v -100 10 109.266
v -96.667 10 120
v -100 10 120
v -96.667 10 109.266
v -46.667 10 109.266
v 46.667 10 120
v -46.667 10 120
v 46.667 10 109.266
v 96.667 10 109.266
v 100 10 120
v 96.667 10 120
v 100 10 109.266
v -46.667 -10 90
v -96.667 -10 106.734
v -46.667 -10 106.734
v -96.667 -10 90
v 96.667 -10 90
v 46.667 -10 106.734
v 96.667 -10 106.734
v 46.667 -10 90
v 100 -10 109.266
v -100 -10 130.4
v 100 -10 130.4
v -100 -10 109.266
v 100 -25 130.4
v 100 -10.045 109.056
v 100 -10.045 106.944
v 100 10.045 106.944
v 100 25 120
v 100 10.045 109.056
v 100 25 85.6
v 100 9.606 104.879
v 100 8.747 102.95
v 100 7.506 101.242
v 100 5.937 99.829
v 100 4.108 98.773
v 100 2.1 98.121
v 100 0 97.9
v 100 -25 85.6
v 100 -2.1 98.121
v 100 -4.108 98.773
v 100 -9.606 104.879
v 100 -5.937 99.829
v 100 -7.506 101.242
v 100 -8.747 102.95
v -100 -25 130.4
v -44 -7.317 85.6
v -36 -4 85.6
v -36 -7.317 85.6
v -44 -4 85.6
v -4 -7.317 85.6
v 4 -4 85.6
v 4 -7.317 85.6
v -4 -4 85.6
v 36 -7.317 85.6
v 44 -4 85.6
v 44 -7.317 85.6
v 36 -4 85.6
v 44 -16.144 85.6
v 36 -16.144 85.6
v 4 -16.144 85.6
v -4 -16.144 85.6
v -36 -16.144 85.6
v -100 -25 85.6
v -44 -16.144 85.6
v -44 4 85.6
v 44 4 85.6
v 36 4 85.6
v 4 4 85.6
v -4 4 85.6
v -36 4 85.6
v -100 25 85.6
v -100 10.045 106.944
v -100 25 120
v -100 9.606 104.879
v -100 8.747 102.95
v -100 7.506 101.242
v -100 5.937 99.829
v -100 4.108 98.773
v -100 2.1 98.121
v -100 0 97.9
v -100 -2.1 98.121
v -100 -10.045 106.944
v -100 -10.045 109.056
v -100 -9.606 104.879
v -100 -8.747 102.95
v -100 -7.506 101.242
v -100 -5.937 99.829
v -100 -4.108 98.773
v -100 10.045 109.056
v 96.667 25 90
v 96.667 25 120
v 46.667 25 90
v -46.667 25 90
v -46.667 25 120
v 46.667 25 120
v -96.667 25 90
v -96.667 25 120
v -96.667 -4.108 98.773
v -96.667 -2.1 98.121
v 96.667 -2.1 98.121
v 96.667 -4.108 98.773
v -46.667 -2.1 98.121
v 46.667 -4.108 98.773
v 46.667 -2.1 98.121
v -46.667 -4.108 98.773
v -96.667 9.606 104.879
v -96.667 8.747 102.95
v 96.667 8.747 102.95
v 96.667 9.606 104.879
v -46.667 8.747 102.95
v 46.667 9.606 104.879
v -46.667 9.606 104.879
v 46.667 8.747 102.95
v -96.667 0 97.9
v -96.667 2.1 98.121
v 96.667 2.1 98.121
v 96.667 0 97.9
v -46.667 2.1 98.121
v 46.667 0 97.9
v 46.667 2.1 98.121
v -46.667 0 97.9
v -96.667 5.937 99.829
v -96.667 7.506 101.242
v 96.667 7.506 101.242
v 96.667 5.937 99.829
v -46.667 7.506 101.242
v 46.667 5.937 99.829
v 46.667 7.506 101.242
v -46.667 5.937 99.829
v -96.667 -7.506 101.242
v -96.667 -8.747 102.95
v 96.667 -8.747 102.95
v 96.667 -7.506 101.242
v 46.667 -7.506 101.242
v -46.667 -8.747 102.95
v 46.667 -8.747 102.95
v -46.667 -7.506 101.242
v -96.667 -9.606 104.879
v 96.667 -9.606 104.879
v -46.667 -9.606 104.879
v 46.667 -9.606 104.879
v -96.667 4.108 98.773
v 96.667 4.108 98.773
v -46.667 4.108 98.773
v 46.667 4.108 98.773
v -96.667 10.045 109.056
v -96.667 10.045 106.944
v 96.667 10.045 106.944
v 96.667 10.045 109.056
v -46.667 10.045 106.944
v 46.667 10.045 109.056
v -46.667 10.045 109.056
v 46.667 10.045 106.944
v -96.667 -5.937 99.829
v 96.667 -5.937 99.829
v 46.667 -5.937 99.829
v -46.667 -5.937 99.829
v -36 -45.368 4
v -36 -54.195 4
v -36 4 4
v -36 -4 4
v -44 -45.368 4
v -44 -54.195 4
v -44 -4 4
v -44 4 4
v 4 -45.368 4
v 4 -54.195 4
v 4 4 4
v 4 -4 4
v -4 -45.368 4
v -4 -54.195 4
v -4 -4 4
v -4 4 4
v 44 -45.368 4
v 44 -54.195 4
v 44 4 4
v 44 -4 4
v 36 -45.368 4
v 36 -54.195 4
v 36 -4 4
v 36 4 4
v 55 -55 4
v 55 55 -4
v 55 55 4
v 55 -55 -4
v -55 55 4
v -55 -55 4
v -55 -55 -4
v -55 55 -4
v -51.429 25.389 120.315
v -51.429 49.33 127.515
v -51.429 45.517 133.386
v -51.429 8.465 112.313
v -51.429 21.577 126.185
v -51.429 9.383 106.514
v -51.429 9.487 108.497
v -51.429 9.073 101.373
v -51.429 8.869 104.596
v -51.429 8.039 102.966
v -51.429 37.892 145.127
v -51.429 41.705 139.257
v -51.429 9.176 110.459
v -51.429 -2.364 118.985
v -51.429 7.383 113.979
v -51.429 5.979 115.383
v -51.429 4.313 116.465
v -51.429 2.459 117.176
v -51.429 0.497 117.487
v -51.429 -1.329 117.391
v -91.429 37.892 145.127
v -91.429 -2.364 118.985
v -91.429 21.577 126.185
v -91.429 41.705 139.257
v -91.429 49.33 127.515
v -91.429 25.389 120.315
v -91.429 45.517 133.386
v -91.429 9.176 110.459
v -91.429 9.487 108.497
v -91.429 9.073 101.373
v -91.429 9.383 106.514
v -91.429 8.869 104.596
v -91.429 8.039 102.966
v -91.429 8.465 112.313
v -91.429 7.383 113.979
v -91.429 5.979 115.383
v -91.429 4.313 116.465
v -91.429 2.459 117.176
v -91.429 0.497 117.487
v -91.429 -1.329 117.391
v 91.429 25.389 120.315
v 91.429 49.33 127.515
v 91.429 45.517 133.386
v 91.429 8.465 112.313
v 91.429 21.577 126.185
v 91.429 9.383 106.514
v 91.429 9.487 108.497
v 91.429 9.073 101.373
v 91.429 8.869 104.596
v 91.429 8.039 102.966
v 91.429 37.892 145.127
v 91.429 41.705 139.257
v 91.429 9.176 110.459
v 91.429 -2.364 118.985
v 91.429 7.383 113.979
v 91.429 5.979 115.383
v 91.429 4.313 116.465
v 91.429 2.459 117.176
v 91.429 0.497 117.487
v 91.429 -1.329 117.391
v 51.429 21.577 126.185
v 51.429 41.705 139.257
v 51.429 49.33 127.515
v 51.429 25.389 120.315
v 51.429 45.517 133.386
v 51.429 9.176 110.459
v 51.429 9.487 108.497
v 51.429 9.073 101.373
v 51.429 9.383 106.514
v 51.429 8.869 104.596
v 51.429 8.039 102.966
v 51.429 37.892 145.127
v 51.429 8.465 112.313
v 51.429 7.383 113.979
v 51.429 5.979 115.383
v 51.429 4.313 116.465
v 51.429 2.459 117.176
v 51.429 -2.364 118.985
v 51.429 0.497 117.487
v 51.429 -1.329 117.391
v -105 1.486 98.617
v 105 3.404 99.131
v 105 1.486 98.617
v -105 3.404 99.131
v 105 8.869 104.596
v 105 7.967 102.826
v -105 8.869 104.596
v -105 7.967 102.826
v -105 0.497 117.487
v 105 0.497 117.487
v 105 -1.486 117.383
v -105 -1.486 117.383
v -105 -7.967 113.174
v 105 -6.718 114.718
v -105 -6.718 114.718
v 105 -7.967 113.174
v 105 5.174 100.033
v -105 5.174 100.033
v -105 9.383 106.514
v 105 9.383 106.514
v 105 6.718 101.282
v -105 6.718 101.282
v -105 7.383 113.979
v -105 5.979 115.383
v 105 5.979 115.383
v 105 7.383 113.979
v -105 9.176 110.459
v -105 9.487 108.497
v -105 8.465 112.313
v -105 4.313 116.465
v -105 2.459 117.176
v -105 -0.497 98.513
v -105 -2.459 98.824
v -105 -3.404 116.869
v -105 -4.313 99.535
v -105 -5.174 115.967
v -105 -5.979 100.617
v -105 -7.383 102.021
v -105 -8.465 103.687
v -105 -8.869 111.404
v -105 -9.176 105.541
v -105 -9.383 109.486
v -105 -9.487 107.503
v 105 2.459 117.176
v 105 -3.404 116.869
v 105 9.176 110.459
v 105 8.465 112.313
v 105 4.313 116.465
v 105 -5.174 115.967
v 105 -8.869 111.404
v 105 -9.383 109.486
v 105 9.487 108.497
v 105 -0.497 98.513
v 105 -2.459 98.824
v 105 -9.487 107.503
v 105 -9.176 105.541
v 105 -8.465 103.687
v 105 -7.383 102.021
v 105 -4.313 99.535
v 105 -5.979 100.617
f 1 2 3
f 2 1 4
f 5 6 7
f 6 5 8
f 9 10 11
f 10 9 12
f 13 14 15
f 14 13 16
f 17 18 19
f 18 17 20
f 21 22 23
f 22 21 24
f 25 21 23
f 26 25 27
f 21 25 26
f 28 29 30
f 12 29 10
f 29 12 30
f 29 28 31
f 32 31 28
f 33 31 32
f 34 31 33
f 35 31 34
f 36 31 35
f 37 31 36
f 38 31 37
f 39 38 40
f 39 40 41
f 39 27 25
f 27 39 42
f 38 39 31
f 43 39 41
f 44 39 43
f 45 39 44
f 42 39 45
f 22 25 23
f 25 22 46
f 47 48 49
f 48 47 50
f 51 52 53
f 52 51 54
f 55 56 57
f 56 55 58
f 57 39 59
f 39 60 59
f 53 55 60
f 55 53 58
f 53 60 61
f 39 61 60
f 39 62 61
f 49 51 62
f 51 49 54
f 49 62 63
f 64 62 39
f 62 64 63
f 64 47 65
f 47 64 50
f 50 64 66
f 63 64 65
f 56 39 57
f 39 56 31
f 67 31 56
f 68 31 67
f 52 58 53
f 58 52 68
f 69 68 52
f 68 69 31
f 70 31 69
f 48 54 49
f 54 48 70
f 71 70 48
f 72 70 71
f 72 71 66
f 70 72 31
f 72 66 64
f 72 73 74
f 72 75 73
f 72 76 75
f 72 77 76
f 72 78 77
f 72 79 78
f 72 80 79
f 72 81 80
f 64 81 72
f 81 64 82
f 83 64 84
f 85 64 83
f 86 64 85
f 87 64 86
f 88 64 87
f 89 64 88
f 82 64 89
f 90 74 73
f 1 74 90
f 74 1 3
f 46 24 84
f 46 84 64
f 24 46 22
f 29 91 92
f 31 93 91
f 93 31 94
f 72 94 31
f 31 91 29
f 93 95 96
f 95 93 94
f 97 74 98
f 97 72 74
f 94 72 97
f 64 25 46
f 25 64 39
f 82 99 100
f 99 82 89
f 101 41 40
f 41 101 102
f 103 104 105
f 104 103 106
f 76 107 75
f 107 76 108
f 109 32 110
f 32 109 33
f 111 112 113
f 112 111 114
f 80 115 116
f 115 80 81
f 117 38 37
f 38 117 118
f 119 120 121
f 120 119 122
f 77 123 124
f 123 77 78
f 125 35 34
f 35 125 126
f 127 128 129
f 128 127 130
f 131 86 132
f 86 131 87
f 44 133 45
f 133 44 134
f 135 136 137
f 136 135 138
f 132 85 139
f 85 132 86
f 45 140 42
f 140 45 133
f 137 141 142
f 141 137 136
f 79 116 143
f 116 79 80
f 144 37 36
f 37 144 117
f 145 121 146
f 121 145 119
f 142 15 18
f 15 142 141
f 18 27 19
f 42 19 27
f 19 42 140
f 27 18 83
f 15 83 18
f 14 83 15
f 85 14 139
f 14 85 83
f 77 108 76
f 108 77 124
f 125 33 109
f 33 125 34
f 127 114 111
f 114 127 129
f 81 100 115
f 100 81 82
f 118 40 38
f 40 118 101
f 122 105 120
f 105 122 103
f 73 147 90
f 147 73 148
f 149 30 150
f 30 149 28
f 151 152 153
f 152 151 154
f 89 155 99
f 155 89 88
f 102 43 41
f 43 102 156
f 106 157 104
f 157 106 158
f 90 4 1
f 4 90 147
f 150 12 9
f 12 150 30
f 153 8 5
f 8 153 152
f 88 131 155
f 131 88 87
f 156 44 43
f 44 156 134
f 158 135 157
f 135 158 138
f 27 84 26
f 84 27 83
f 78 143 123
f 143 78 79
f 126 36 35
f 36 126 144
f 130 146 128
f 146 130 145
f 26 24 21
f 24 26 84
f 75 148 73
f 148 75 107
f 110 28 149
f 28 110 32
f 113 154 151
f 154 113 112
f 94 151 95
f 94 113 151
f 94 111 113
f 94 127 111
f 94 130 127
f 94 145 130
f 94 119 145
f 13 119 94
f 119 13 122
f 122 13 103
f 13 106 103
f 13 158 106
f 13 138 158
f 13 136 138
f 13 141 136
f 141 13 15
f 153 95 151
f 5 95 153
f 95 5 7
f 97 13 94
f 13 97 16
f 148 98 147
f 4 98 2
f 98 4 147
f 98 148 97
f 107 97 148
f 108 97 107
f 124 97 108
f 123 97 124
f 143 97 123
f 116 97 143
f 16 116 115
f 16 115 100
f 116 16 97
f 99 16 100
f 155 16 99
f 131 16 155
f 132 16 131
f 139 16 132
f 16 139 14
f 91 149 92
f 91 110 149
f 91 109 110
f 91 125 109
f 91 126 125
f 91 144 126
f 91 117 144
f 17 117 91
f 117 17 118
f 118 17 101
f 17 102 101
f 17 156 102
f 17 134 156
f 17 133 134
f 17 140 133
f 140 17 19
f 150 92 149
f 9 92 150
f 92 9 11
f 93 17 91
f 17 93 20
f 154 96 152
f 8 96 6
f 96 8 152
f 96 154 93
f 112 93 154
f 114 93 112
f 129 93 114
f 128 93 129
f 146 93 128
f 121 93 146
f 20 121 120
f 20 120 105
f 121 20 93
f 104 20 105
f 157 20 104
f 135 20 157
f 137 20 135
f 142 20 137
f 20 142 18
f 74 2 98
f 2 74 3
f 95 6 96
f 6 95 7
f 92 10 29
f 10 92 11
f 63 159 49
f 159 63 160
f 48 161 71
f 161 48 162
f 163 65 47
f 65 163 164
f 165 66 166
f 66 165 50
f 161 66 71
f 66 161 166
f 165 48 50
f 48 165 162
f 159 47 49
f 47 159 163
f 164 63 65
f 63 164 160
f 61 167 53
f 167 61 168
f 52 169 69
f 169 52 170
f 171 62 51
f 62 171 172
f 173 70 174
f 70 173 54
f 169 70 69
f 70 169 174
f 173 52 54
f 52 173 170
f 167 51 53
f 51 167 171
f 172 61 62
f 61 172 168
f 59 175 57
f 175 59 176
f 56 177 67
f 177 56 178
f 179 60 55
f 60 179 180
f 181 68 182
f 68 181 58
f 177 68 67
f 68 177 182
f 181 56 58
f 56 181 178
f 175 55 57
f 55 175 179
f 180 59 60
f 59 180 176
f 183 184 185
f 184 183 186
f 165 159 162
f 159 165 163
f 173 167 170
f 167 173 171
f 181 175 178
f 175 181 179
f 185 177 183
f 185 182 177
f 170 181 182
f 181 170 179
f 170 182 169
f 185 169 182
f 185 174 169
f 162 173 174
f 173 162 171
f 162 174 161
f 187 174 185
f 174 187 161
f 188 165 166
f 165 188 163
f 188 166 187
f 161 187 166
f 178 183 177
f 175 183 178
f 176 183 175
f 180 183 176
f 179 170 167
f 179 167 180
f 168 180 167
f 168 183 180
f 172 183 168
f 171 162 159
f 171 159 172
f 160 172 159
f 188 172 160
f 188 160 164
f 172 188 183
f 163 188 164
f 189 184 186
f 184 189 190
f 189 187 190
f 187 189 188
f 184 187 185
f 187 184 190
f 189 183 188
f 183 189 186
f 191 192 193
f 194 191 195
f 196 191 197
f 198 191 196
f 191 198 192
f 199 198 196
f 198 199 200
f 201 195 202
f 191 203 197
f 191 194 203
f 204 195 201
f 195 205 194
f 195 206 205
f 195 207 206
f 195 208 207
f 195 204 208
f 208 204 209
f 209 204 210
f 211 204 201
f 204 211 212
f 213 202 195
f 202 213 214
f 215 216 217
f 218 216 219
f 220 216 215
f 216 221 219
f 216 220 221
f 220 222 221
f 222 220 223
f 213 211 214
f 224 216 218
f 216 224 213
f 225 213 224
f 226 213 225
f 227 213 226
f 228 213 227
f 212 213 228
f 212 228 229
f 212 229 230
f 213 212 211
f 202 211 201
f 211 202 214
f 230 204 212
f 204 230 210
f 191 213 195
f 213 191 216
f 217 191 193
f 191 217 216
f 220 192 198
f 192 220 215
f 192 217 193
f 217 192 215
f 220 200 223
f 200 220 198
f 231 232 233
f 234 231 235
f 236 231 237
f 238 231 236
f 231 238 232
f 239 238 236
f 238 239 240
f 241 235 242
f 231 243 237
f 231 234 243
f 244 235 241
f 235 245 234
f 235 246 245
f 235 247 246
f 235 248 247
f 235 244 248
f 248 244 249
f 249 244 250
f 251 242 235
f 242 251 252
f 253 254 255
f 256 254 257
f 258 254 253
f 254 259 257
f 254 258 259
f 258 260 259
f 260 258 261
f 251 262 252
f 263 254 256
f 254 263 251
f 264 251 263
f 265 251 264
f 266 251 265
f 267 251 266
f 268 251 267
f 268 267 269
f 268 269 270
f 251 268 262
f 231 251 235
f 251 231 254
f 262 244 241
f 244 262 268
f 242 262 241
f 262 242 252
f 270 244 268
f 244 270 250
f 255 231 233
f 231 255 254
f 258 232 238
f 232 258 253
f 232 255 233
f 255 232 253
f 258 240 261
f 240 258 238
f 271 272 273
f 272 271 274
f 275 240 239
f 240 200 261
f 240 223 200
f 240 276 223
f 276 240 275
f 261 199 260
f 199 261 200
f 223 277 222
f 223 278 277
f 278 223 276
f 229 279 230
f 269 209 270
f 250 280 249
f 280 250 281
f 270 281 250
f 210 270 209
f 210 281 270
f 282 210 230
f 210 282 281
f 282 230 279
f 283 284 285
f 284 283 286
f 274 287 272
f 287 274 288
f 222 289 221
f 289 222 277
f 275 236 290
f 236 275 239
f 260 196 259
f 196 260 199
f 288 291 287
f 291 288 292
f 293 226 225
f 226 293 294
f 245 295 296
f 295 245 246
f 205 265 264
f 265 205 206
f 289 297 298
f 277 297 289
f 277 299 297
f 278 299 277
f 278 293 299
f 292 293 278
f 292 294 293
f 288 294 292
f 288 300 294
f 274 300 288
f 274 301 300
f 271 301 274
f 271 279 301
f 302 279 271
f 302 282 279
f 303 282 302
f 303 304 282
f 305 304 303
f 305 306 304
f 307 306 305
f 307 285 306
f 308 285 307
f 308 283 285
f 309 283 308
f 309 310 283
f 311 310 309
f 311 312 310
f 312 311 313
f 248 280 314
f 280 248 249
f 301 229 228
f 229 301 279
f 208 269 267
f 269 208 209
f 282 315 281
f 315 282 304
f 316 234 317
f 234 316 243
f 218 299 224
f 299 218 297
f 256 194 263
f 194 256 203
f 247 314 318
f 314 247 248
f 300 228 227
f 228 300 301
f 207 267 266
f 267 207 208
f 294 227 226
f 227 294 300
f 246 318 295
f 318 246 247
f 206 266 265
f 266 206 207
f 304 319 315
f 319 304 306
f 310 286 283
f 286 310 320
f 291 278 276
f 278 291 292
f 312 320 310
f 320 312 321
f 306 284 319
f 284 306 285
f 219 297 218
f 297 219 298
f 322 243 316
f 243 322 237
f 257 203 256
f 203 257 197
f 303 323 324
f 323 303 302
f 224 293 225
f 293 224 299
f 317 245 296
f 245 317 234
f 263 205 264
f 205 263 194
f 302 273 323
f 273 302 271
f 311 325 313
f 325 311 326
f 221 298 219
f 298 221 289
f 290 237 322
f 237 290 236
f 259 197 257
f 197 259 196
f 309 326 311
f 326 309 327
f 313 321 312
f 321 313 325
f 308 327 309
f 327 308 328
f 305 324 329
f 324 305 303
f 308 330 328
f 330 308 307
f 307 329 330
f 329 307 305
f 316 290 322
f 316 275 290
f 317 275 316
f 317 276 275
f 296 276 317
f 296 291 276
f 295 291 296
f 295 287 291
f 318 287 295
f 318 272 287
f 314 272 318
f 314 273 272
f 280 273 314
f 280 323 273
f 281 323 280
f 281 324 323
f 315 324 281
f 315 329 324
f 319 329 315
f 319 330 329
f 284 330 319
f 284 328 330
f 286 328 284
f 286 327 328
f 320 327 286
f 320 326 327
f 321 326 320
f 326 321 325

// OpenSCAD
// file: clampipe.scad
   include <../robot_settings.scad>

module clam_pipe() {
      // clam pipe
       translate([0, 0, 0]) {
          rotate([0, 90, 0])
          cylinder(h = rail_width + 10, d = 19, center = true);
       }

       blade_length = 48;
       filling_length = 26;
      
      // clams
       translate([0, 13, 0])
       {
         // right upper clam blade
        translate([-rail_width / 2.8,  15, rail_thickness])
        cube([rail_width / 5,  blade_length, rail_thickness], center = true);
         
         // right filling
         translate([-rail_width / 2.8, 2, -1])
         cube([rail_width / 5, filling_length, rail_thickness + 2], center = true);
         
         // right lower clam blade
        translate([-rail_width / 2.8,  15, -rail_thickness])
        cube([rail_width / 5,  blade_length, rail_thickness], center = true);
         
         // left filling
         translate([rail_width / 2.8, 2, -1])
         cube([rail_width / 5, filling_length, rail_thickness + 2], center = true);
         
        // left upper clam blade
        translate([rail_width / 2.8,  15, rail_thickness])
        cube([rail_width / 5,  blade_length, rail_thickness], center = true);
        
         // left lower clam blade
        translate([rail_width / 2.8,  15, -rail_thickness])
        cube([rail_width / 5,  blade_length, rail_thickness], center = true);
      }
    }
    clam_pipe();
// file: ../robot_settings.scad
main_box_x = 95; // 96
main_box_y = 102;
main_box_z = 74; // 74.5
wall_thickness = 2;

rail_gap = 2;
rail_inset = 7;

rail_thickness = 7;
rail_length = 250;
rail_width = 200;

raspberry_pi_screw_seperation_y = 57;
raspberry_pi_screw_seperation_z = 48;
raspberry_pi_peg_h = 4;

gears_module = 1;
pinion_gear_teeth = 30;
pinion_gear_width = 5;
pinion_gear_bore = 4;

gears_setback_distance = 25;
gear_post_height = 2 * pinion_gear_width + rail_thickness + 8 ;

steering_motor_mount_x = 45;
steering_motor_mount_y = 36;
steering_motor_mount_z = 18;
steering_motor_mount_setback_distance = gears_setback_distance + 16;

dc_motor_drivertype = "Teyleten"; // Teyleten
isAdafruit = (dc_motor_drivertype == "Adafruit");

drv8871_x = isAdafruit ? 20.3 : 21.6;
drv8871_y = isAdafruit ?  24 : 25;

drv8871_z = 2;
drv8871_screw_d = 2.5;
drv8871_solder_points_z = 2;

drv8871mount_edge_x = 1.5;
drv8871mount_edge_wall = 3;
drv8871mount_z = 5;
drv8871mount_x = drv8871_x +  drv8871mount_edge_wall - 2* drv8871mount_edge_x;
drv8871mount_y = 19;

drv8871_screw_distance = 15.64;
drv8871_solder_points_d = 1.66;
drv8871_solder_offset_y = 4.4;
drv8871_solder_inner_points_distance = 5;
drv8871_solder_outer_points_distance = 12;

dc_motor_housing_minus_encoder_z = 48;
dc_motor_encoder_z = 9.33;
dc_motor_encoder_wheel_d = 13.4;
dc_motor_encoder_wheel_thickness = 5;
dc_motor_encoder_wheel_gap = 3;
dc_motor_encoder_circuit_thickness = 2;
dc_motor_cutout_d = 24.8;
dc_motor_cutout_z = 19.5;

dc_motor_screw_head_z = 2;
dc_motor_screw_head_d = 5.6;
dc_motor_screw_d = 3.2;
dc_motor_screw_offset = 8.5;

dc_motor_axle_ring_z = 3;
dc_motor_axle_ring_d = 7.2;
dc_motor_axle_cutout_d = 4.5;
dc_motor_axle_cutout_z = 10;
dc_motor_axle_notch_cutout = 0.4;
dc_motor_axle_notch_cutout_z = 6;

pdmount_x = 20;
pdmount_y = 30;
pdmount_z = 2;
pdmount_edge_x = 1.5;
pdmount_edge_wall = 3;

steering_shaft_z = 45;
steering_shaft_d = 7;
steering_shaft_motor_fitting_d = 9;
coupler_length = 24.6;
coupler_diameter = 14;
coupler_screw_d = 4;
coupler_screw_z_offset = 5;
coupler_gear_side_insert = 12.6;
steering_shaft_with_coupler_z = steering_shaft_z - coupler_gear_side_insert;

lidar_mount_y = 110;
lidar_mount_x = 65 + 20;
lidar_narrow_screws = 40;
lidar_wide_screws = 56;
lidar_front_to_back_screws = 70;
lidar_screw_d = 3;
lidar_circuitboard_x = 20;
lidar_circuitboard_y = 35;
lidar_circuitboard_z = 1.2;
lidar_cord_length = 29;

ball_bearing_height = 7;
ball_bearing_outer_diameter = 22;
ball_bearing_inner_diameter = 8;

pull_bar_radius = 3.3;

rack_module = 1;
rack_length = main_box_x / 2;
rack_height = 10;
rack_width = 10;
rack_teeth = 30;
rack_bore = 3;

// tire hardware
axle_length = 30;
axle_reciever_inner_diameter = 7.75;
axle_reciever_length = 18.8;
axle_notch_length = 7;
axle_notch_cutout = 2.4;

// power distribution bar
power_bar_cutout_x = 96;
power_bar_y = 19.1;
power_bar_z = 1.5;
power_bar_screw_distance = 91.4;
power_bar_screw_d = 2.8;
power_bar_standoff_z = 5;
power_bar_standoff_d = 6.83;

// breadboard
breadboard_wall_thickness = 3;
breadboard_width = 55;
breadboard_length = 83;
breadboard_height = 10.5;
breadboard_notch_width = 3.8;
breadboard_longside_notch_separation = 58.2 - breadboard_notch_width / 2;
breadboard_shortside_notch_separation = 26.3 - breadboard_notch_width;

pico_expander_width = 63;
pico_expander_height = 57;
pico_screw_hole_offset = 3;
pico_screw_hole_d = 2.5;
// main file
   include <../robot_settings.scad>
   use <clampipe.scad>
   
   // front end jack
  module back_jack(
    show_pipe = true,
    show_structure = true
    ) {
      
  if (show_structure == true) {
      // platform
      translate([0,  0, 0])
      cube([110, 110, 8], center = true);
        
      // top holder structure
      difference() {
          translate([0, 0, 108])
          cube([rail_width, 50, dc_motor_cutout_d + 20], center = true);
          
          
          translate([0, 0, 108])
          rotate([0, 90, 0])
          cylinder(h = rail_width * 2, d = 20.2, center = true);

          // right turnbox carve out
          translate([-rail_width / 3 - 30, -10, 90])
          cube([rail_width / 4, 50,  dc_motor_cutout_d + 25]); 

          // right turnbox carve out
          translate([rail_width / 3 - 20, -10, 90])
          cube([rail_width / 4, 50,  dc_motor_cutout_d + 25]); 
    
        // flatten the top front holder structure to allow for more angles of freedom of the clam pipe
        translate([- rail_width / 2 - 1, 7, 120])
          cube([rail_width + 2, 20, 20]);
        
          // carve out the top so that the pipe can be added removed
          translate([0, 0, 108])
            difference() {
                translate([0, 0, 22])
                cube([rail_width+ 1, 20, dc_motor_cutout_d + 20], center = true);
            
              translate([0, 0, 0])
              rotate([0, 90, 0])
              cylinder(h = rail_width + 1.1, d = 20, center = true);
          }
    }


    difference() {
      
      union () {
         // left post
        translate([-40, 0, 54])
        cube([8,8,108], center = true);
        
        // left back support
        translate([-40,  -26, 55])
        rotate([-25, 0, 0])
        cube([8, 8, 120], center = true);
        
        // center post
        translate([0, 0, 108/2])
        cube([8,8, 108], center = true);
       
        // center back support 
        translate([0,  -26, 55])
        rotate([-25, 0, 0])
        cube([8, 8, 120], center = true);
        
        // center post
        translate([40, 0, 108/2])
        cube([8,8, 108], center = true);
       
        // center back support 
        translate([40,  -26, 55])
        rotate([-25, 0, 0])
        cube([8, 8, 120], center = true);
      }
     
      // carve out for claim pipe (otherwise the support columns get in the way
       translate([50, 0, 108])
        rotate([0, 90, 0])
        cylinder(h = 2 * rail_width, d =21, center = true);
    }
}


  if (show_pipe) {
      // clam pipe
       translate([0, 0, 108]) {
         rotate([33, 0, 0])
         clam_pipe();
       }
  }
}
back_jack();
